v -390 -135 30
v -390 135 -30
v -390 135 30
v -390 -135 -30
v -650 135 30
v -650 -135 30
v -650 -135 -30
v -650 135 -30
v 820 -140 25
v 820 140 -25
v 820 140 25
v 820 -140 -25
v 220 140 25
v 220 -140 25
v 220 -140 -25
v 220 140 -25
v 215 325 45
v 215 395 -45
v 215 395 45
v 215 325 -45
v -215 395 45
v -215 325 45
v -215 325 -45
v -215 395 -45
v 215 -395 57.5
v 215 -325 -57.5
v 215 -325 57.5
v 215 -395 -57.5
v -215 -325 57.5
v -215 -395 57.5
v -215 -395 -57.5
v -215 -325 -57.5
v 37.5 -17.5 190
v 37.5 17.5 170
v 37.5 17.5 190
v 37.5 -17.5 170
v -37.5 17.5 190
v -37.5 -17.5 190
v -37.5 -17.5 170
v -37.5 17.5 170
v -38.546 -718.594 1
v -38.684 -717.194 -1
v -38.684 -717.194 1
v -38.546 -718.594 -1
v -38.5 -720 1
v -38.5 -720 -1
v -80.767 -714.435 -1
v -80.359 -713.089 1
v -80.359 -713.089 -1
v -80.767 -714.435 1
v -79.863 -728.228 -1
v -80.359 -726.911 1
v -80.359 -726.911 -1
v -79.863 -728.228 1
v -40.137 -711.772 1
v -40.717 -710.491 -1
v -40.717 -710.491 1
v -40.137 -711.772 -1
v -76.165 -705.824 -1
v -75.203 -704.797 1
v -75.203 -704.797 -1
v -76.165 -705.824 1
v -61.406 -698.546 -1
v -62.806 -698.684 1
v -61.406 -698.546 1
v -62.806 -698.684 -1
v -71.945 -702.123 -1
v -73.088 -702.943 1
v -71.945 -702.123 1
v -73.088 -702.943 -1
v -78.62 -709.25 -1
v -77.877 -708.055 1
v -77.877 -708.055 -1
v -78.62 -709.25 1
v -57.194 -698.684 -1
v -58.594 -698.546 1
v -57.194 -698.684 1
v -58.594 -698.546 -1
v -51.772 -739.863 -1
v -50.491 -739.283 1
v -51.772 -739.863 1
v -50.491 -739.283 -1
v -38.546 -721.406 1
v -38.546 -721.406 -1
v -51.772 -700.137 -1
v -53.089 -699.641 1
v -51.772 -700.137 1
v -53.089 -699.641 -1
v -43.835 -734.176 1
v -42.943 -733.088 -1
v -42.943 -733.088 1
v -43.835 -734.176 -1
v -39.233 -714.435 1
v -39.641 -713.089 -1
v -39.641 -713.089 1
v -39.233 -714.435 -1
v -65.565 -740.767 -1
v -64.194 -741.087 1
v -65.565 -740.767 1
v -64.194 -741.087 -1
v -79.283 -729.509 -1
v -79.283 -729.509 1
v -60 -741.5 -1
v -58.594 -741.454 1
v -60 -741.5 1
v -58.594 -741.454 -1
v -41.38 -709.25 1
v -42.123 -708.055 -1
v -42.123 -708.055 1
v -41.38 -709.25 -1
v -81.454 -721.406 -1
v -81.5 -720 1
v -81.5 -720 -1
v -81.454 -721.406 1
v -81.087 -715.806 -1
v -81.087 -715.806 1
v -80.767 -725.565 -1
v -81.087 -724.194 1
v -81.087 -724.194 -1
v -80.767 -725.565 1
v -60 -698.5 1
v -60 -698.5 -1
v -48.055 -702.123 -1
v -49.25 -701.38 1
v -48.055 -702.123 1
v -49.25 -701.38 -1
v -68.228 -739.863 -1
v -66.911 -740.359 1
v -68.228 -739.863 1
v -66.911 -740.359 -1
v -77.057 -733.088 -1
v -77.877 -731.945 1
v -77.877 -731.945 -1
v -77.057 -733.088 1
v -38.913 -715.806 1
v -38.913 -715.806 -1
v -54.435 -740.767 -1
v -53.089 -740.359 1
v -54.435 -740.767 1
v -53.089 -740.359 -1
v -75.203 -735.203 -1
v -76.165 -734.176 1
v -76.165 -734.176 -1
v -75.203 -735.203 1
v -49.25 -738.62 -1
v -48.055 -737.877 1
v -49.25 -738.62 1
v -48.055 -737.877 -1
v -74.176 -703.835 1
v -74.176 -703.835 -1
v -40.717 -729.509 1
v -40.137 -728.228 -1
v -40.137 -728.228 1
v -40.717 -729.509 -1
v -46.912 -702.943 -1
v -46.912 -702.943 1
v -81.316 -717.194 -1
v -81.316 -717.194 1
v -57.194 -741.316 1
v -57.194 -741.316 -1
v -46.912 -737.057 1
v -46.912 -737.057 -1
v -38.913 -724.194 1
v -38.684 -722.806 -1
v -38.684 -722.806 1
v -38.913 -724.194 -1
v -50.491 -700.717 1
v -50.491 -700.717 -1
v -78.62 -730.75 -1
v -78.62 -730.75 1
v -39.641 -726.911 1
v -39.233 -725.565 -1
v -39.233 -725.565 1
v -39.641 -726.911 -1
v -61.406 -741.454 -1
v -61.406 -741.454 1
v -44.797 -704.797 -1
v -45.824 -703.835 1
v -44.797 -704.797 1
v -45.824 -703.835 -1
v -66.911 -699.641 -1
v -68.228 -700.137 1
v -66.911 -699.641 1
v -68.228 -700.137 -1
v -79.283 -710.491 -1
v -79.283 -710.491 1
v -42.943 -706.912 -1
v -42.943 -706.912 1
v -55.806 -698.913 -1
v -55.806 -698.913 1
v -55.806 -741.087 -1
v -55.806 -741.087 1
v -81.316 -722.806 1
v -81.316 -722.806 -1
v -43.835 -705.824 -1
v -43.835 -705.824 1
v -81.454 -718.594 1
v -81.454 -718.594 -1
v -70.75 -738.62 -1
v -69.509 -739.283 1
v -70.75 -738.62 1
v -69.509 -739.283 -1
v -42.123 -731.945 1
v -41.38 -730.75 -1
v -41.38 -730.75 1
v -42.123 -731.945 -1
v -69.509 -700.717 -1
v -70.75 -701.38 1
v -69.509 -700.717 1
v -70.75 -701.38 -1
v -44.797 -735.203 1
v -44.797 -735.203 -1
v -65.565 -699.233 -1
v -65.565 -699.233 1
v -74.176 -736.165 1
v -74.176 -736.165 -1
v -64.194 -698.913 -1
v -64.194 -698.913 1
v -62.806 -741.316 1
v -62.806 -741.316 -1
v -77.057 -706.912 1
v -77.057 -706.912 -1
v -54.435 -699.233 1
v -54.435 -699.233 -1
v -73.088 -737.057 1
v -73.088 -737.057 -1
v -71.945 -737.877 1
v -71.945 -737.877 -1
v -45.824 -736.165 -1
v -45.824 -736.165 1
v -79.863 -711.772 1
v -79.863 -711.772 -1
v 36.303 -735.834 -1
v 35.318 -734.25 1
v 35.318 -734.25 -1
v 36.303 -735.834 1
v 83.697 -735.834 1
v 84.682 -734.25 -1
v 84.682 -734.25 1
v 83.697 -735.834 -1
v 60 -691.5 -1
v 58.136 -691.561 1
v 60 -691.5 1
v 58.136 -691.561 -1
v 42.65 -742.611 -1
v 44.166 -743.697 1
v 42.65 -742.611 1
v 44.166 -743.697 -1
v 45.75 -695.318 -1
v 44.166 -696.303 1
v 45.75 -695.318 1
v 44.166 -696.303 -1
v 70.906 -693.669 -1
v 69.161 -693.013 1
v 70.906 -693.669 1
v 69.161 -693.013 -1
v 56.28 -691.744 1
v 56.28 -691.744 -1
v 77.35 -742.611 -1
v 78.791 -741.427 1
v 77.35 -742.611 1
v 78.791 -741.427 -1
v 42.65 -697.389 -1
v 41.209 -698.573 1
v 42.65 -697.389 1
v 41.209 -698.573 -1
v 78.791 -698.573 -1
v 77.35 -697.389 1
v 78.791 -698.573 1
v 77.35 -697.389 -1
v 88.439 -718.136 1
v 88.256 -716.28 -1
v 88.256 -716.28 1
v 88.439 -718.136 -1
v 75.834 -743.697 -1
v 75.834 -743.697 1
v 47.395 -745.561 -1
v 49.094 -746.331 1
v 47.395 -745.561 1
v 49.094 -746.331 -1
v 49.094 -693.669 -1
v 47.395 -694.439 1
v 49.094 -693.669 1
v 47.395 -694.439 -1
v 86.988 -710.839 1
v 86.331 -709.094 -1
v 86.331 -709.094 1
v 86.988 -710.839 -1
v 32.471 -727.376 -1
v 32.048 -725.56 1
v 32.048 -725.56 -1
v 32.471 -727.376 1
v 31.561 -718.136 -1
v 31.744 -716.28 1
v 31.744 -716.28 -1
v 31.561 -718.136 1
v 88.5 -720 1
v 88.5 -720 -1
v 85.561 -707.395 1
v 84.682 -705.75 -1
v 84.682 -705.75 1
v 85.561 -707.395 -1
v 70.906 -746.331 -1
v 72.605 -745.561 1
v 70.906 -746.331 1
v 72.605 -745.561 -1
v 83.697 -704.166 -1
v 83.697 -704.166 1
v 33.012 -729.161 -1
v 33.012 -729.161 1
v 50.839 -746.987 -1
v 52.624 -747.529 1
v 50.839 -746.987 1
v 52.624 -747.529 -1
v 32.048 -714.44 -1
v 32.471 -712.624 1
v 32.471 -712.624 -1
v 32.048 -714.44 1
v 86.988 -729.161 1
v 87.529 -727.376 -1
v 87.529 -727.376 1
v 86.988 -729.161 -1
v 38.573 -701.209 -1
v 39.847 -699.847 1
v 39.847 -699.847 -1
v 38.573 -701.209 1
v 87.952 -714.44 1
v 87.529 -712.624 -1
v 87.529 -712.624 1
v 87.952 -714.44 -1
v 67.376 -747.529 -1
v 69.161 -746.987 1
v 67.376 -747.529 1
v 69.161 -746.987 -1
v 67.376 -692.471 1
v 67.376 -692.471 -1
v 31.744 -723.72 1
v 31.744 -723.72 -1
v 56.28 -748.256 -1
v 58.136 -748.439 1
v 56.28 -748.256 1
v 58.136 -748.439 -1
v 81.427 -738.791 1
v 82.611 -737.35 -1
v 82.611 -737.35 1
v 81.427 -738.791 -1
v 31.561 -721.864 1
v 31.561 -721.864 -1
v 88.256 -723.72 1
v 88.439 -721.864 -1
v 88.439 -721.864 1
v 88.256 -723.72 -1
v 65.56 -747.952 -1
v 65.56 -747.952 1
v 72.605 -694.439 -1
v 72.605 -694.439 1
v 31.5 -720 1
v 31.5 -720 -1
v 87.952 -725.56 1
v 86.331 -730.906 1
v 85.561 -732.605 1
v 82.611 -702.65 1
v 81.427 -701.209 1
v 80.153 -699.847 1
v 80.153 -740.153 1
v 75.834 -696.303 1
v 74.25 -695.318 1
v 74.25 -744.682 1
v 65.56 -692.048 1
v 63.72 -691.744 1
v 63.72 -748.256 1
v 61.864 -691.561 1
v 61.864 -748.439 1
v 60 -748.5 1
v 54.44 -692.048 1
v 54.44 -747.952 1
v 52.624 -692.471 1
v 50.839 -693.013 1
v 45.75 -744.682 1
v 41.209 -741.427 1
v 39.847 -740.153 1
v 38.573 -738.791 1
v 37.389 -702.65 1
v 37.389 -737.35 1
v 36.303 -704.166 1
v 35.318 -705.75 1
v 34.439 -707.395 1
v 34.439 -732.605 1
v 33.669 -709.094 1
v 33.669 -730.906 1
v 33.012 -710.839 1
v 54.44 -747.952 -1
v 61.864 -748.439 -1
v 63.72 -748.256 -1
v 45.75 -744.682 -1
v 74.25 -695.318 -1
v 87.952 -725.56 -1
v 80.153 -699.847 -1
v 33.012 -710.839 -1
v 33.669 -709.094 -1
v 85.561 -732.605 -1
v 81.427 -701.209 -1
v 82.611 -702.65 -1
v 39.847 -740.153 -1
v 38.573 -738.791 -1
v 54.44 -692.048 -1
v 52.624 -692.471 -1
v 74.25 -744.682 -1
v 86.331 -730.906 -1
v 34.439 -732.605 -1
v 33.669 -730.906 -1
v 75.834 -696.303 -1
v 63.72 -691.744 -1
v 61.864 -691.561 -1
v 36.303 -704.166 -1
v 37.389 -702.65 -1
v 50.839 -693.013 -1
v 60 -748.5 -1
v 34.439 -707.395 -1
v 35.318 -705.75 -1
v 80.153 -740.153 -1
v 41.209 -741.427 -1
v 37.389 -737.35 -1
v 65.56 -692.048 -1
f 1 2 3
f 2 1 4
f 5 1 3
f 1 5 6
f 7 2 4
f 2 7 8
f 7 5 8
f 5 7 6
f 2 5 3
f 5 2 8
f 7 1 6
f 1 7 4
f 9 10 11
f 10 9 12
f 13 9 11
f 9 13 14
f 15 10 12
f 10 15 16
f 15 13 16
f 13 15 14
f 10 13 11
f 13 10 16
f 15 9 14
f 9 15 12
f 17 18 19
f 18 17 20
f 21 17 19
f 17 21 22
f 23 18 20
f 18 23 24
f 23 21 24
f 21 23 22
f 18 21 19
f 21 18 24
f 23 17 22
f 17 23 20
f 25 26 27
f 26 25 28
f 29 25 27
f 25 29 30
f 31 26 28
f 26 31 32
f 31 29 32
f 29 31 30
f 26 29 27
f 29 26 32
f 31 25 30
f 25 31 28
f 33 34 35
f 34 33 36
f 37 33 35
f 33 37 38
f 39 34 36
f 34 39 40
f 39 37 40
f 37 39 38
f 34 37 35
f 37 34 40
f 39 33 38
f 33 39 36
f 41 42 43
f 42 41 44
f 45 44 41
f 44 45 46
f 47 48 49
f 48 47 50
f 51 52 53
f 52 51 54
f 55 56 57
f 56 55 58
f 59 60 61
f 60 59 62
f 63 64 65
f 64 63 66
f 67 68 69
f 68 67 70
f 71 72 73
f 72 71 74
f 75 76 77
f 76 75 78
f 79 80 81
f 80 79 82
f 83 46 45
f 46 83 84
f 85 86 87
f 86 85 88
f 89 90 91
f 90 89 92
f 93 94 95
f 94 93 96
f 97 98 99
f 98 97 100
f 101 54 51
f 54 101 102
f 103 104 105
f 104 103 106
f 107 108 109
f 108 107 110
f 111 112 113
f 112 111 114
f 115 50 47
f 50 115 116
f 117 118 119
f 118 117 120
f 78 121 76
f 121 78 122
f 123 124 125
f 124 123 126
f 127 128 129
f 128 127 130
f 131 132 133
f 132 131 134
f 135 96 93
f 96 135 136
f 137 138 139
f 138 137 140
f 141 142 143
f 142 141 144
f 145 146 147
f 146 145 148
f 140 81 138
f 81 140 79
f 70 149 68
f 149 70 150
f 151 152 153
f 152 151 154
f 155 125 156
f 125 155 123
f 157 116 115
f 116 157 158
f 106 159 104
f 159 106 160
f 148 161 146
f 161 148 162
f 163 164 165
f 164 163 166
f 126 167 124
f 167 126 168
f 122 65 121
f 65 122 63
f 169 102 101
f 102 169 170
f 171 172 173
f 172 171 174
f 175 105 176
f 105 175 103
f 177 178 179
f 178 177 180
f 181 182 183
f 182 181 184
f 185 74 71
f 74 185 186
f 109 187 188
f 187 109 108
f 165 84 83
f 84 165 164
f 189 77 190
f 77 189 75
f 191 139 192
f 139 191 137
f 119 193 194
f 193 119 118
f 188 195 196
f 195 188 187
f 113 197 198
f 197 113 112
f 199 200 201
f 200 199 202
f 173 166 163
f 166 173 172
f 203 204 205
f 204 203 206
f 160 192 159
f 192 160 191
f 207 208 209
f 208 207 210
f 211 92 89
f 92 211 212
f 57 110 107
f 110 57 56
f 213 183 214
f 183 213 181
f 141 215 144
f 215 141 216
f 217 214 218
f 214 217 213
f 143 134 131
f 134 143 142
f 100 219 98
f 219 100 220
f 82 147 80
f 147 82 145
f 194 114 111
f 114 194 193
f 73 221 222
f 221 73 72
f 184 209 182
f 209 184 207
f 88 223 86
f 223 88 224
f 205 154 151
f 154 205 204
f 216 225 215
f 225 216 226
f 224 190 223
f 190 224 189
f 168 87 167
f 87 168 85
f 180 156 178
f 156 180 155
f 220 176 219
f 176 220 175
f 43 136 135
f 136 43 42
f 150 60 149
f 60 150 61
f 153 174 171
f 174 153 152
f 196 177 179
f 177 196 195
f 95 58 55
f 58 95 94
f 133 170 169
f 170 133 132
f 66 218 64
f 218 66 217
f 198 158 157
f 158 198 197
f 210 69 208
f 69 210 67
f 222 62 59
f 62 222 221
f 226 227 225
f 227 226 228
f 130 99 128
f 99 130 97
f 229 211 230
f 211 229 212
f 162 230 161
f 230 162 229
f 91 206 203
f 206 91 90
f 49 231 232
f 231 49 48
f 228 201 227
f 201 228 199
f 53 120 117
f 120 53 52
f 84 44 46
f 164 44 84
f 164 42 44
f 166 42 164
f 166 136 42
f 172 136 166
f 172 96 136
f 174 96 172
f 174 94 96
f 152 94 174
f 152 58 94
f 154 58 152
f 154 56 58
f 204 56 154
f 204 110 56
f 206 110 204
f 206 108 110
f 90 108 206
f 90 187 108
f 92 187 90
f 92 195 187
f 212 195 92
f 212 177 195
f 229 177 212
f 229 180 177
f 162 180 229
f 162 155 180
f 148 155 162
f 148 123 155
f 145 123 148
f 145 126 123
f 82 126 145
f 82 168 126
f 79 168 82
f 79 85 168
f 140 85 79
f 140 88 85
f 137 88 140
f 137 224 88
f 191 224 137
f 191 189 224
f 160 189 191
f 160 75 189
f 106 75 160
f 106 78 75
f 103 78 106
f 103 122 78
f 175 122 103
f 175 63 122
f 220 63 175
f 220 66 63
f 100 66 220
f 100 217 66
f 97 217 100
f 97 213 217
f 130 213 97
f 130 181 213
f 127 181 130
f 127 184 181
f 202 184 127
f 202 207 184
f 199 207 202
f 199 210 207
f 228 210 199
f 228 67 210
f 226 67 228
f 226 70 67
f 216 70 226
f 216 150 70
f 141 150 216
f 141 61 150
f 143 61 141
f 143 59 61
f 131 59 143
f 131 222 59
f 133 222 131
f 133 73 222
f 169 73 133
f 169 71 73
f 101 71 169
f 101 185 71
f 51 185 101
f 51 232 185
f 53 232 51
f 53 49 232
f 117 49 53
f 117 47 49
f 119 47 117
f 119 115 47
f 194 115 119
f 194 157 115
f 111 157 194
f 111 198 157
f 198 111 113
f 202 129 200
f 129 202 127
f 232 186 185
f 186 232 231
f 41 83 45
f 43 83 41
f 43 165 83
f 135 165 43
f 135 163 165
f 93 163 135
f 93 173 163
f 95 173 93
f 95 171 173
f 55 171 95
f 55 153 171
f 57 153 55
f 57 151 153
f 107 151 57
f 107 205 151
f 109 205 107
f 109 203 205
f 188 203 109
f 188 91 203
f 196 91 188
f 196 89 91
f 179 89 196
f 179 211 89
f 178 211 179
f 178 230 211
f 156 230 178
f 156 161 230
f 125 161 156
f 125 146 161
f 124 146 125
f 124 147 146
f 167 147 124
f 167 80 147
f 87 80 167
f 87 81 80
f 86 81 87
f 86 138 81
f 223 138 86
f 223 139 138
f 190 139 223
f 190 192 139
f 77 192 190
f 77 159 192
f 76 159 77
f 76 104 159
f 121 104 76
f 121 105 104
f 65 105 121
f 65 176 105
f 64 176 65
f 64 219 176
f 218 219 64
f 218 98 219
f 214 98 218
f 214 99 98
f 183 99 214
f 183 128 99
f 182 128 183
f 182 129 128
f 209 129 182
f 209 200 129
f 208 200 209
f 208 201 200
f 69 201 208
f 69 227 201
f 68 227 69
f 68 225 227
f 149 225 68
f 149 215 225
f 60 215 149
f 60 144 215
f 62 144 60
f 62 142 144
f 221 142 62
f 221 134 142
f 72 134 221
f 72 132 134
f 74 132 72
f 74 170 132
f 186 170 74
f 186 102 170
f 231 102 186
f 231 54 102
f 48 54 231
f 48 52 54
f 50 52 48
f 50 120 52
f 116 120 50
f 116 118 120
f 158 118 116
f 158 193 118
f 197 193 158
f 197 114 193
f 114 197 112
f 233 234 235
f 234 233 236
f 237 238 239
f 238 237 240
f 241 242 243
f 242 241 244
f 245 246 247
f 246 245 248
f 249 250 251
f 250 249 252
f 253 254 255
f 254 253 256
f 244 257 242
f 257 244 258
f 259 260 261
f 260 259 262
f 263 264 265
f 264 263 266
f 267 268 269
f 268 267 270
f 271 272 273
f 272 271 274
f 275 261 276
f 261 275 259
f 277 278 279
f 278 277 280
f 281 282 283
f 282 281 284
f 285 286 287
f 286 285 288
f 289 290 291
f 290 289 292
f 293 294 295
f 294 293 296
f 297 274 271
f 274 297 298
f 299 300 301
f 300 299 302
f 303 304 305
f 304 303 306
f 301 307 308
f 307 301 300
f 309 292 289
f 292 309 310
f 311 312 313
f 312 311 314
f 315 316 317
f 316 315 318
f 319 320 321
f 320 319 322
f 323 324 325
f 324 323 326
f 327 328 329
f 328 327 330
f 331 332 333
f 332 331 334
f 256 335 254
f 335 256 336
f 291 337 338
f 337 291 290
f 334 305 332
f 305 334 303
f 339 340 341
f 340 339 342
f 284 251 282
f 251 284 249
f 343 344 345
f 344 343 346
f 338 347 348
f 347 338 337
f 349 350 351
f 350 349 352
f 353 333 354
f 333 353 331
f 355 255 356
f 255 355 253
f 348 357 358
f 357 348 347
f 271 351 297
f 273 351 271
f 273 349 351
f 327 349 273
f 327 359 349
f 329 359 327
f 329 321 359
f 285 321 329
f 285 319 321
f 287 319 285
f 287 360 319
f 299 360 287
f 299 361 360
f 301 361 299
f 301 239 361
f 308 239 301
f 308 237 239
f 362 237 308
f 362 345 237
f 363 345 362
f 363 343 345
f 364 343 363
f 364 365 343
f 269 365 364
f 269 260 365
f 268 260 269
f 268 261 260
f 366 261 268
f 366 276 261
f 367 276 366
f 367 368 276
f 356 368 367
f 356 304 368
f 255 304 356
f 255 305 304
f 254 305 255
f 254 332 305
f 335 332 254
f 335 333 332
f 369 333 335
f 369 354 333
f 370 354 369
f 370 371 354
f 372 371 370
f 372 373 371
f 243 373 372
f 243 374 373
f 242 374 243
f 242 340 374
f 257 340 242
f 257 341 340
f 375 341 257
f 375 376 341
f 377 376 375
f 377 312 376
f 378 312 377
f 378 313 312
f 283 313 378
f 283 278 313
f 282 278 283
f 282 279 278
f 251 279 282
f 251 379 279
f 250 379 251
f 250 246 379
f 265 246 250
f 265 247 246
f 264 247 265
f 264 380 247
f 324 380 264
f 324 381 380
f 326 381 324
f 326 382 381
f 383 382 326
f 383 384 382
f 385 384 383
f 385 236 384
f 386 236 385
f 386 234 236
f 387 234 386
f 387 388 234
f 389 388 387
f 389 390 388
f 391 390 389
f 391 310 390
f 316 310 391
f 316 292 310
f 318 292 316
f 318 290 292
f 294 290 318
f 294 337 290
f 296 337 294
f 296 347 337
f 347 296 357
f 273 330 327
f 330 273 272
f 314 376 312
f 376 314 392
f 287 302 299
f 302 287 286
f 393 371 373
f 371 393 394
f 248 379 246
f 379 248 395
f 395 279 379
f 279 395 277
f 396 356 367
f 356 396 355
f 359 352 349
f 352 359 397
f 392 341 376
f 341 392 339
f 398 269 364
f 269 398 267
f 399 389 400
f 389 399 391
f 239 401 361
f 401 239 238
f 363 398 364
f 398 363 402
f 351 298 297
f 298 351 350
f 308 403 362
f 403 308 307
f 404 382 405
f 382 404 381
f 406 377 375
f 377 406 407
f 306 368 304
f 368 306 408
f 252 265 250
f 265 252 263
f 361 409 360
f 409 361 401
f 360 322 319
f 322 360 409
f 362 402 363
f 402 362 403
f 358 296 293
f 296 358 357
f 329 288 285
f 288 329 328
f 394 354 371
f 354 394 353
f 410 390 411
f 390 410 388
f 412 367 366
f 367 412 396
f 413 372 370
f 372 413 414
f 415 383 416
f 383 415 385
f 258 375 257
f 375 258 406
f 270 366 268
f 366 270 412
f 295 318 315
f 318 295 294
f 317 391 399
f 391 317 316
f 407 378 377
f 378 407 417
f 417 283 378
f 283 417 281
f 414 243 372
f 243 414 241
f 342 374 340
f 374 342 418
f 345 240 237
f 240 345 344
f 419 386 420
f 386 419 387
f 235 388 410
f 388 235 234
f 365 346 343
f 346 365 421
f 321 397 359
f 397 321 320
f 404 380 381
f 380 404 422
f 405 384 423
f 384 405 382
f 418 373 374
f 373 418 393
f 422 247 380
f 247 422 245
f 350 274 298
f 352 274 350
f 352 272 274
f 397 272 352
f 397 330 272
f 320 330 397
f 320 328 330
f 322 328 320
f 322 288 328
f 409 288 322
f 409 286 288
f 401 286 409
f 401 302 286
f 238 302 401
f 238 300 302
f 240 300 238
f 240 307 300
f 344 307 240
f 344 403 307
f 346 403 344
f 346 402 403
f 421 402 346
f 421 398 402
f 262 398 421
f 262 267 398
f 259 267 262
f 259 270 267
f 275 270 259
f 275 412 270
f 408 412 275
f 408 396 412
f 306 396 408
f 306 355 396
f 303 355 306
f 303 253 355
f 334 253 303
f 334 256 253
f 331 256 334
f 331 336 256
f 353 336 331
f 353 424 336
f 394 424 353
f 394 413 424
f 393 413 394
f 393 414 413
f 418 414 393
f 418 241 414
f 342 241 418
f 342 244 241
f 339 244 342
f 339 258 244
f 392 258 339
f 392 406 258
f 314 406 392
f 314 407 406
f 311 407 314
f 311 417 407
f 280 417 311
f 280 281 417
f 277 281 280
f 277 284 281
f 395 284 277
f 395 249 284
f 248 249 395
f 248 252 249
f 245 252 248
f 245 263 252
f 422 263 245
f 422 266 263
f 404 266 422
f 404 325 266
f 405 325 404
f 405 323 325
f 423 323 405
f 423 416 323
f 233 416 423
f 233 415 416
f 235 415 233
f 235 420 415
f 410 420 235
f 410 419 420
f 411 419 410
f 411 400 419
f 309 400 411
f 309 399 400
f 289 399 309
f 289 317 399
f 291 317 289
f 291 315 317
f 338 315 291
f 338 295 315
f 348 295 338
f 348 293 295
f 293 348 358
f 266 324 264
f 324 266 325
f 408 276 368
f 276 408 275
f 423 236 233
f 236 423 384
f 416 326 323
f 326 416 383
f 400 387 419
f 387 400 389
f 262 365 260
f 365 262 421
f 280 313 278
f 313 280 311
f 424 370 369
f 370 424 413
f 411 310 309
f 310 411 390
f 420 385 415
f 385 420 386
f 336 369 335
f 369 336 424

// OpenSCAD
// PET 107-45 charge-air F1 guides; not OEM shapes or interfaces.
// Component offsets and two aftermarket diameter coupons are display-only.
$fn = 96;
coupon_thickness_mm = 2.000000; // visualization hypothesis only

module envelope_guide(size_mm) { cube(size_mm, center = true); }
module diameter_coupon(diameter_mm) {
    cylinder(h = coupon_thickness_mm, d = diameter_mm, center = true);
}

// 993-INTERCOOLER-REPLACEMENT-AKS: aftermarket_core_only_not_complete_OEM_intercooler_envelope
993_intercooler_replacement_aks_mm = [260.000000, 270.000000, 60.000000];
translate([-520.000000, 0.000000, 0.000000])
    envelope_guide(993_intercooler_replacement_aks_mm);

// 993-INTERCOOLER-AIR-DUCT: supplier_replacement_product_bounding_box_not_OEM_surface
993_intercooler_air_duct_mm = [600.000000, 280.000000, 50.000000];
translate([520.000000, 0.000000, 0.000000])
    envelope_guide(993_intercooler_air_duct_mm);

// 993-INTERCOOLER-PRESSURE-HOSE-RIGHT: supplier_replacement_product_bounding_box_not_OEM_surface
993_intercooler_pressure_hose_right_mm = [430.000000, 70.000000, 90.000000];
translate([0.000000, 360.000000, 0.000000])
    envelope_guide(993_intercooler_pressure_hose_right_mm);

// 993-INTERCOOLER-PRESSURE-HOSE-LEFT: supplier_replacement_product_bounding_box_not_OEM_surface
993_intercooler_pressure_hose_left_mm = [430.000000, 70.000000, 115.000000];
translate([0.000000, -360.000000, 0.000000])
    envelope_guide(993_intercooler_pressure_hose_left_mm);

// 993-INTERCOOLER-TEMPERATURE-SENSOR: supplier_product_bounding_box_not_thread_or_probe_geometry
993_intercooler_temperature_sensor_mm = [75.000000, 35.000000, 20.000000];
translate([0.000000, 0.000000, 180.000000])
    envelope_guide(993_intercooler_temperature_sensor_mm);

// Aftermarket 43/57 mm coupons: no side, endpoint or OEM applicability assigned.
translate([-60.000000, -720.000000, 0])
    diameter_coupon(43.000000);
translate([60.000000, -720.000000, 0])
    diameter_coupon(57.000000);
